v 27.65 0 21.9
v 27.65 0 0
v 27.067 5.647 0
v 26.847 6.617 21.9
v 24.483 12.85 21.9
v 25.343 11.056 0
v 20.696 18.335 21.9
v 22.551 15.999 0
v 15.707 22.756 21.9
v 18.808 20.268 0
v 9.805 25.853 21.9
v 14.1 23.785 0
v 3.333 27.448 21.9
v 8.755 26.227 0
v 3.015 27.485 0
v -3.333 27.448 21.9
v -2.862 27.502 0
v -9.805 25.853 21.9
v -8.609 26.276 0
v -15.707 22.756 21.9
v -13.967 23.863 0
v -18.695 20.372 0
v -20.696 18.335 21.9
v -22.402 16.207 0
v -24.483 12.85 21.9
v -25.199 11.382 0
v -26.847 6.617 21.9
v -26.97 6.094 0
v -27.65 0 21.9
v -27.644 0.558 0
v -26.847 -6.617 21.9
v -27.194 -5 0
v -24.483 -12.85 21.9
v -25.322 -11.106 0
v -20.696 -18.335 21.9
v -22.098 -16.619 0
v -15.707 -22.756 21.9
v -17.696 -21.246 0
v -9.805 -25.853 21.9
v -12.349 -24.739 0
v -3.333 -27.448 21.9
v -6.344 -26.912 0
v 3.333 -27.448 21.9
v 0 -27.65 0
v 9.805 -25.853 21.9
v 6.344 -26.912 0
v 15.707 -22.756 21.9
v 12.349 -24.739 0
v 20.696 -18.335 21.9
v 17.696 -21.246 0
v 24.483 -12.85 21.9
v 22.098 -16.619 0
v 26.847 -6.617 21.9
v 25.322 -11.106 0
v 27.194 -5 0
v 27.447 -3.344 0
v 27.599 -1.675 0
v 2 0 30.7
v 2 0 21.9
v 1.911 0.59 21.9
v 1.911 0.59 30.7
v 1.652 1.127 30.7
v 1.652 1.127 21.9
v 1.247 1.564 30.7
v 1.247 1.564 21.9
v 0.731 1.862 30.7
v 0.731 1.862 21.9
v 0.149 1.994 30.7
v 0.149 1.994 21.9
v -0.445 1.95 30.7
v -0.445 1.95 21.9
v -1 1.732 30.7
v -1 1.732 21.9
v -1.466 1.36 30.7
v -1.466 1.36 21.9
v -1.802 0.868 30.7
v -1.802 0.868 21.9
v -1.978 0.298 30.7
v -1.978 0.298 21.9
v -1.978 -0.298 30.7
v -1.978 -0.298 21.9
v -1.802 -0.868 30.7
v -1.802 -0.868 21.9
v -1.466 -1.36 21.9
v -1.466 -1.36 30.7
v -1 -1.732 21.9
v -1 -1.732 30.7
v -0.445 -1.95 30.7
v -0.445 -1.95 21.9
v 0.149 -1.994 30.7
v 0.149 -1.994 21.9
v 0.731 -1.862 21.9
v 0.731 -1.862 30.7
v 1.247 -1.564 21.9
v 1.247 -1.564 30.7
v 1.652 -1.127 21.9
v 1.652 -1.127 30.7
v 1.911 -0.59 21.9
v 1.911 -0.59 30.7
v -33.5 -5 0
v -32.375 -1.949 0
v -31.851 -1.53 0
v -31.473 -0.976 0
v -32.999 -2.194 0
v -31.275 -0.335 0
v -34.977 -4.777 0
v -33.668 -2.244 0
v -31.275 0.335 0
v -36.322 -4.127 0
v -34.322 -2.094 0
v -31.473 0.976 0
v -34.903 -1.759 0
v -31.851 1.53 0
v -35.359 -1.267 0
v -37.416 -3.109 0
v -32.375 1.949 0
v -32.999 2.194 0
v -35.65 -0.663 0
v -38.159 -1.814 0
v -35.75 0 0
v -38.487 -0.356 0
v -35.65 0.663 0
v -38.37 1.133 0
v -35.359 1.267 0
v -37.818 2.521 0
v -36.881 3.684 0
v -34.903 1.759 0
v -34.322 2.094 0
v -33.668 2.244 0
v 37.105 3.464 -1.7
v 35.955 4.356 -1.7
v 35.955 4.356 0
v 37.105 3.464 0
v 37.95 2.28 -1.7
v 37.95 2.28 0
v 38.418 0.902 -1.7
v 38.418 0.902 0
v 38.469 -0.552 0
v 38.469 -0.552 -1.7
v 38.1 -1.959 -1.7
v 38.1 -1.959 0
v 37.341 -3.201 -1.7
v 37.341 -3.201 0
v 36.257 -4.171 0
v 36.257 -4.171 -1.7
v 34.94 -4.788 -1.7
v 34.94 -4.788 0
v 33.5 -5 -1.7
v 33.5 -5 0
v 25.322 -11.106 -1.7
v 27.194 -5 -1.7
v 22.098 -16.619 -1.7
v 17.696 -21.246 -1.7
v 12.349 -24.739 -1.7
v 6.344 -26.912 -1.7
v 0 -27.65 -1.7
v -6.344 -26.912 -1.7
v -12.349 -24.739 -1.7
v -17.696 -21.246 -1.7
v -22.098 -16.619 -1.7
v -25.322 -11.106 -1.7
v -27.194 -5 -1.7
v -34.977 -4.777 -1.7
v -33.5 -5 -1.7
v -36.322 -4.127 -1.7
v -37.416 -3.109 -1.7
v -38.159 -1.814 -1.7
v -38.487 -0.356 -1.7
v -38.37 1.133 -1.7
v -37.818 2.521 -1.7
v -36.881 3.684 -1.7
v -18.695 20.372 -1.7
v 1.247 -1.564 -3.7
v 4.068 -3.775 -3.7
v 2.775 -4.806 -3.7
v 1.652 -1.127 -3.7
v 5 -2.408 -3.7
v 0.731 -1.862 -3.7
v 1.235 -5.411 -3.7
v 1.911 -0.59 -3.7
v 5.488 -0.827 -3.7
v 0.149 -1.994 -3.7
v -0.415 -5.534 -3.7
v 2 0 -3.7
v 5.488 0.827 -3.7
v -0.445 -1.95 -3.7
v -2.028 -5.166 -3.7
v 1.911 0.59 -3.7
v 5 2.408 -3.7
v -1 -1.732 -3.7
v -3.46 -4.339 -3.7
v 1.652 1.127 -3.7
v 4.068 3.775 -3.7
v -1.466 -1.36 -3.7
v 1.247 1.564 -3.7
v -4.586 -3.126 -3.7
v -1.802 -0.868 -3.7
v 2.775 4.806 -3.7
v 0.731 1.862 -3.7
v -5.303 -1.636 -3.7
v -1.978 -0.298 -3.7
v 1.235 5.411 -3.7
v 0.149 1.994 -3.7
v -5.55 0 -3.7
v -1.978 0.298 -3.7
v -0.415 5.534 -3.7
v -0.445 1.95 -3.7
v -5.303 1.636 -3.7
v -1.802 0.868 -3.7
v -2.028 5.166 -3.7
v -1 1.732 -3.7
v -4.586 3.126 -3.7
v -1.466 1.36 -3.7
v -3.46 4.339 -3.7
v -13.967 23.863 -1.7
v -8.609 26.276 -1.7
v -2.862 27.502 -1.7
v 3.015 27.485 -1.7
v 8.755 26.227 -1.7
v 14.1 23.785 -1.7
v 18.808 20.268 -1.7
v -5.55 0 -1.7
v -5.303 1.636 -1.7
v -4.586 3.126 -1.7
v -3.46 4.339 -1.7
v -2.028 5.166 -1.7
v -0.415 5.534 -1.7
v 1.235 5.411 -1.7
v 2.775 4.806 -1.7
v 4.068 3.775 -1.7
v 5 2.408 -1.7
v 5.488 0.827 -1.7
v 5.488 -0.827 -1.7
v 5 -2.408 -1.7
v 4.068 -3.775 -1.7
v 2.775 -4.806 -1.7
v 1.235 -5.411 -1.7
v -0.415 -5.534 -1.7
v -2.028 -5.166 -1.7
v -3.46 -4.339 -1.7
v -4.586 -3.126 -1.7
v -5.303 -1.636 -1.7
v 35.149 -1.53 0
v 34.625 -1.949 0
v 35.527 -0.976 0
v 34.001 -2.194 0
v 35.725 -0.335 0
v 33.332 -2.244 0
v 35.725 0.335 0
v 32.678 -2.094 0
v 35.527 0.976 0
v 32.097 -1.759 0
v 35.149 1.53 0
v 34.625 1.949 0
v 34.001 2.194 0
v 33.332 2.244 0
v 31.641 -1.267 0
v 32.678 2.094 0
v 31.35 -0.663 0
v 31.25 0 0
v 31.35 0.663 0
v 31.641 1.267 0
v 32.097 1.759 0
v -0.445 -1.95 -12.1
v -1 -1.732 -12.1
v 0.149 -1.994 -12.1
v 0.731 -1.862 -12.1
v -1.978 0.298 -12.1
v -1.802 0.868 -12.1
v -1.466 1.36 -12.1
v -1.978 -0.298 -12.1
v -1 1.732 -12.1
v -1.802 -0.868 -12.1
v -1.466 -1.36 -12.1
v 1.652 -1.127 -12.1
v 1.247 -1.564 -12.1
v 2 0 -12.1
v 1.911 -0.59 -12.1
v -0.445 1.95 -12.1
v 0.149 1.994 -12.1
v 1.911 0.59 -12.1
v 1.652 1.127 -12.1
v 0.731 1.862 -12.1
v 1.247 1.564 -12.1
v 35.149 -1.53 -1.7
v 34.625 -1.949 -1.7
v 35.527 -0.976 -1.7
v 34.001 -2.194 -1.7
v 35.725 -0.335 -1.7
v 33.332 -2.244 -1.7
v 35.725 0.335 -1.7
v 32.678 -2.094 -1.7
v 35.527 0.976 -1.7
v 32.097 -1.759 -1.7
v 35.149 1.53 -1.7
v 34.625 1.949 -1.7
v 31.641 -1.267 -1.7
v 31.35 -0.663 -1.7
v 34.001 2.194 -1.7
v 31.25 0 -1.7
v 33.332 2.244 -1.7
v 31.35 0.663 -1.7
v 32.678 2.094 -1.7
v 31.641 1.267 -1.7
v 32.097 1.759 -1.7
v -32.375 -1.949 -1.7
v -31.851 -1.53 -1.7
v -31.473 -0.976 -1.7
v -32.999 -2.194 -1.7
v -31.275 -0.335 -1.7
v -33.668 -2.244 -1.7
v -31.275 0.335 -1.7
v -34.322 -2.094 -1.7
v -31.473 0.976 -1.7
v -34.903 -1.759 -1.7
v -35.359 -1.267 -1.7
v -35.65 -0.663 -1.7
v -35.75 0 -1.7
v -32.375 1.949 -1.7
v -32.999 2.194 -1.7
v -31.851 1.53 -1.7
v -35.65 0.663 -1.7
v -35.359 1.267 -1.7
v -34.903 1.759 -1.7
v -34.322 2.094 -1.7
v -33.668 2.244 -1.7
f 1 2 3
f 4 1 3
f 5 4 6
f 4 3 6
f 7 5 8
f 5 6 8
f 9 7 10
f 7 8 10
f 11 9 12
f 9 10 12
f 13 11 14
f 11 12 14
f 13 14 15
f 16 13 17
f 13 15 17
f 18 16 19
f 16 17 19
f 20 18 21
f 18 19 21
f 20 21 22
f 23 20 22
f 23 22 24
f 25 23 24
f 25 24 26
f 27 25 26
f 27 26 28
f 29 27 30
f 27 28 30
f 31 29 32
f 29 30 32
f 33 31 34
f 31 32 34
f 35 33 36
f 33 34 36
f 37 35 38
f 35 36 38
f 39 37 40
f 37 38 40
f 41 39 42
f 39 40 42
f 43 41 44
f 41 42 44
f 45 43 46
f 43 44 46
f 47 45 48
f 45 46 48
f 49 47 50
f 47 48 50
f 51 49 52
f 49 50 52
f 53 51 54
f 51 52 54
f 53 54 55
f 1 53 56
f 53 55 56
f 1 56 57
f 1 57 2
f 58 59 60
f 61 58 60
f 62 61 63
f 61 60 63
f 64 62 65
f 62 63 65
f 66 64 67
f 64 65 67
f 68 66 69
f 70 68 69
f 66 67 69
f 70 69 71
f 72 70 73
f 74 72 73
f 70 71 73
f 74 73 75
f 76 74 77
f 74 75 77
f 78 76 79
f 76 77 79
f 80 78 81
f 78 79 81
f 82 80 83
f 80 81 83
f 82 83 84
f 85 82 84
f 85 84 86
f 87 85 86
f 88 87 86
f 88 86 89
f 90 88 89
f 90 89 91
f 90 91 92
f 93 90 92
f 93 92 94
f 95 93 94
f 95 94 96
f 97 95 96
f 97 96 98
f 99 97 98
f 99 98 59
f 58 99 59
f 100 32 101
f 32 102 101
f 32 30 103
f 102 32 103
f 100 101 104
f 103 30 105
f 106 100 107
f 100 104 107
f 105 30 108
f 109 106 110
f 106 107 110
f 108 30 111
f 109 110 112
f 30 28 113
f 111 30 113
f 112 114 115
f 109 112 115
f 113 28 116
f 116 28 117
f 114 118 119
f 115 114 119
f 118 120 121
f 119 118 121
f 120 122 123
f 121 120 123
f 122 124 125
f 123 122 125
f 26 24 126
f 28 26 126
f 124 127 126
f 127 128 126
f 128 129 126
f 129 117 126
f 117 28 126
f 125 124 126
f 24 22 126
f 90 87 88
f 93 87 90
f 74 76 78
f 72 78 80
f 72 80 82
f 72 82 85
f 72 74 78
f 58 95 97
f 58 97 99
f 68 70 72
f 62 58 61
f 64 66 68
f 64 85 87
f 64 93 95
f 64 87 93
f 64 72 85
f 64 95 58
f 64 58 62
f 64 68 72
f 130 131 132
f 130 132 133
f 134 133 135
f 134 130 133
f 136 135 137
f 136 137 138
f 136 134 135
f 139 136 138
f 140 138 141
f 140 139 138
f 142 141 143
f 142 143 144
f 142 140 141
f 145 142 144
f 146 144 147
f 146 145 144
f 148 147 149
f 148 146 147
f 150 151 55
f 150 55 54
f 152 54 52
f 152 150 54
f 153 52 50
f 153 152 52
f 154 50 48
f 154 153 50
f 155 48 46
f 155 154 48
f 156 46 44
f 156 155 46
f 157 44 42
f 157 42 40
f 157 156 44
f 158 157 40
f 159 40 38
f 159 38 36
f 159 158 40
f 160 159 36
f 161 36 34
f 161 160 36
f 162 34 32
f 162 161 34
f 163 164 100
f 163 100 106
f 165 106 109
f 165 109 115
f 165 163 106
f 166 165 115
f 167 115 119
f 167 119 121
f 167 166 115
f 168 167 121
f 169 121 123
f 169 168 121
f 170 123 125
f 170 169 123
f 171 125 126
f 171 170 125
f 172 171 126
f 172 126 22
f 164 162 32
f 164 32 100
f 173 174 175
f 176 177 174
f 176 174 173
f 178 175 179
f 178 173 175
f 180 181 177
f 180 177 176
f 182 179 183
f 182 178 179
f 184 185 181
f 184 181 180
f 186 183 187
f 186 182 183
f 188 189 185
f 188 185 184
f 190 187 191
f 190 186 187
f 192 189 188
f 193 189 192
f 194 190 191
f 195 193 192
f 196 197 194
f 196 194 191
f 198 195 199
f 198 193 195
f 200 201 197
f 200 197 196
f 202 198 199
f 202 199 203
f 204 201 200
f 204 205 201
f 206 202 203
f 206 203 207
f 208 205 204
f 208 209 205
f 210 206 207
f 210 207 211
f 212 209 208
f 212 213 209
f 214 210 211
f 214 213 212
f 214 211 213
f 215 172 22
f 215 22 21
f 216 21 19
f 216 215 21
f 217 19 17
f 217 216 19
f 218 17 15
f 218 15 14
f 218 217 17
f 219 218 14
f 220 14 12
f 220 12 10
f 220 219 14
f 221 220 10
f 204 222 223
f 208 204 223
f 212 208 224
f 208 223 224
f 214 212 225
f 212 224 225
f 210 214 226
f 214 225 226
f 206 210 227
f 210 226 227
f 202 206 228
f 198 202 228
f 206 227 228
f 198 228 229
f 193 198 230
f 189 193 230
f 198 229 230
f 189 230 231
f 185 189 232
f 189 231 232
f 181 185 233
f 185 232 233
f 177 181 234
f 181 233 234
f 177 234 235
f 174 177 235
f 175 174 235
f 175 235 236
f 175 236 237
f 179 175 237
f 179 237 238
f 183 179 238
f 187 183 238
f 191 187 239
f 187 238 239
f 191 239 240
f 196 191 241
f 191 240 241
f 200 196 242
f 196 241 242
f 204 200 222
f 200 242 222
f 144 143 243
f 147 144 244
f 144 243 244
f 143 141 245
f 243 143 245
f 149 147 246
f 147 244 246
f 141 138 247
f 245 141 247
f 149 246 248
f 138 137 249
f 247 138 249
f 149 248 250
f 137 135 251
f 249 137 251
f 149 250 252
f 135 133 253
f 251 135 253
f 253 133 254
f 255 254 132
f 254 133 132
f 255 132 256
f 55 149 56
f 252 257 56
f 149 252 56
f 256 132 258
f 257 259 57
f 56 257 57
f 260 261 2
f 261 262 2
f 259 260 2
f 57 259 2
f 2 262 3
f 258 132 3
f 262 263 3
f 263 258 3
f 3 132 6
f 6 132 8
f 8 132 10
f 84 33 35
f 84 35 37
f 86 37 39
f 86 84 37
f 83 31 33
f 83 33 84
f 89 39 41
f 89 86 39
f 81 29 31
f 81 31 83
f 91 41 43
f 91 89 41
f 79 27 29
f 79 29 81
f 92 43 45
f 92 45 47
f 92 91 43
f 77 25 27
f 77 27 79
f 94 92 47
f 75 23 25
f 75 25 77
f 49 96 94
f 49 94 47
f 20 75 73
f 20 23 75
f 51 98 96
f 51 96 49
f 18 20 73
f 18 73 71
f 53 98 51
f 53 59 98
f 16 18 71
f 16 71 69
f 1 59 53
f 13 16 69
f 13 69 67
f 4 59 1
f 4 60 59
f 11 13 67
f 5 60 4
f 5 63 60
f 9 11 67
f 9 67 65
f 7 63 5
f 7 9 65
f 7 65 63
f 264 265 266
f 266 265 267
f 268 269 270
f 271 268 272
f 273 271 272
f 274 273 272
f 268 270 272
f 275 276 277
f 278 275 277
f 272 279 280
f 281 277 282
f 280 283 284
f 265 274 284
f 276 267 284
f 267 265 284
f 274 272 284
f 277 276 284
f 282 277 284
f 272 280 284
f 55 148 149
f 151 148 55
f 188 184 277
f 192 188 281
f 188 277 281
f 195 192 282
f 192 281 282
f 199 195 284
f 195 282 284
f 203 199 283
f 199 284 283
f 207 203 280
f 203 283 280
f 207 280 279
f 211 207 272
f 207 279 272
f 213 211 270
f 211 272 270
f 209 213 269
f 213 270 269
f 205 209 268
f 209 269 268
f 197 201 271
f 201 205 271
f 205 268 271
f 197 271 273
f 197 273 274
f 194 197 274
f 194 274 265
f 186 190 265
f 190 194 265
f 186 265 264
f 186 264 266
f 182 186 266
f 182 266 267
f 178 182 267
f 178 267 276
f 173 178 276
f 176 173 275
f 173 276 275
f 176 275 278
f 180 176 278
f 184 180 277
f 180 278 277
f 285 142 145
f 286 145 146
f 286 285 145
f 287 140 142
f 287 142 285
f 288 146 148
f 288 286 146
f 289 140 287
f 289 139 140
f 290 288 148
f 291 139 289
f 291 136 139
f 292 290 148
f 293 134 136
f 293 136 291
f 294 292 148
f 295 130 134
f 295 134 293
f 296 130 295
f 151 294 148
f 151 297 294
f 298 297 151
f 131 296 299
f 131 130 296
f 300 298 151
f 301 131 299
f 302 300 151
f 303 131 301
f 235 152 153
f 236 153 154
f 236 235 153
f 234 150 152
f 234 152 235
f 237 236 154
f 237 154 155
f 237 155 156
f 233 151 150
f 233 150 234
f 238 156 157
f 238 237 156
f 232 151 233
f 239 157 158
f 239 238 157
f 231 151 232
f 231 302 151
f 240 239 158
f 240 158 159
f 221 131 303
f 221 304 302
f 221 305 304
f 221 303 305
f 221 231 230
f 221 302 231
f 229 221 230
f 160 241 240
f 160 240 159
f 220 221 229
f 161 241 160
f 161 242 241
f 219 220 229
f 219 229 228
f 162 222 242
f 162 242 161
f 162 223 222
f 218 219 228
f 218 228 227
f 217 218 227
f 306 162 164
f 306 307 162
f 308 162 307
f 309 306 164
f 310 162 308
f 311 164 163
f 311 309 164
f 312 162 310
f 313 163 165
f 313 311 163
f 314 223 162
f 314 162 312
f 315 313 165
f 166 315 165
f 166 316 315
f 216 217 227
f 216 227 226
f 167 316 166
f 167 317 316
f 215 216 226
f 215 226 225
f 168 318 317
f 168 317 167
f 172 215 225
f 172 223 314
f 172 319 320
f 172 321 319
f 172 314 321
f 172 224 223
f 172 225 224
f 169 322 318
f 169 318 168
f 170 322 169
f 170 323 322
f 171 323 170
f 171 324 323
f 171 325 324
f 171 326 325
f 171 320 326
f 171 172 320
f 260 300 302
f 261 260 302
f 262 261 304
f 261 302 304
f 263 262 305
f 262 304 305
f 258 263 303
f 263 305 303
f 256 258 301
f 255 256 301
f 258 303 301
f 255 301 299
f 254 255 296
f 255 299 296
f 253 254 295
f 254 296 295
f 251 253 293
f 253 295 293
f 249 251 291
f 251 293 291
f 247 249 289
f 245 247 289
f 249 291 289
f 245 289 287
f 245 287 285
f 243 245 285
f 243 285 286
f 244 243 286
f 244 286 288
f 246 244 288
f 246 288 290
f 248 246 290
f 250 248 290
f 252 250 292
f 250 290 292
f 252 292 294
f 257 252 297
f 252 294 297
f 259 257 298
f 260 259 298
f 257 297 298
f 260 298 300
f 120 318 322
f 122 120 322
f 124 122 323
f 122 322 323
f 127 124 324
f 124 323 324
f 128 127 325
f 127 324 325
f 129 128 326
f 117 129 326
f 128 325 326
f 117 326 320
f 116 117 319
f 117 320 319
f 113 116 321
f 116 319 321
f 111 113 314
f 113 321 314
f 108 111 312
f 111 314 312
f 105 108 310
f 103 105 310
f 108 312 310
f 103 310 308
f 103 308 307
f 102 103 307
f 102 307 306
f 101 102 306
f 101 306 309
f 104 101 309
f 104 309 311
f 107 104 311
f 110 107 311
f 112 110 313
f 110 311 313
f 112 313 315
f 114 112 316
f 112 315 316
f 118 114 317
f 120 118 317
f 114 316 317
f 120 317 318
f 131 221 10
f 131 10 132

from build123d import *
from build123d.topology import SkipClean

# Parameters (mm, degrees)
CROQUIS1_R                   = 27.65
SALIENTE_EXTRUIR1_DEPTH      = 21.9
SALIENTE_EXTRUIR2_DEPTH      = 8.8
SALIENTE_EXTRUIR2_DEPTH_BACK = 34
CROQUIS2_R                   = 2
SALIENTE_EXTRUIR3_START      = 1.7
CROQUIS3_R                   = 2.25
CROQUIS3_R_2                 = 2
SALIENTE_EXTRUIR3_DEPTH      = 1.7
CROQUIS4_R                   = 5.55
SALIENTE_EXTRUIR4_DEPTH      = 2


with BuildPart() as part:
    # Croquis1 → Saliente-Extruir1 (new body)
    with BuildSketch(Plane.XY):
        Circle(CROQUIS1_R)
    extrude(amount=SALIENTE_EXTRUIR1_DEPTH)

    # Croquis2 → Saliente-Extruir2 (add, two sides: drawn at the far end of the back side and taken through both)
    with BuildSketch(Plane.XY.offset(21.9).offset(-SALIENTE_EXTRUIR2_DEPTH_BACK)):
        Circle(CROQUIS2_R)
    extrude(amount=SALIENTE_EXTRUIR2_DEPTH + SALIENTE_EXTRUIR2_DEPTH_BACK)

    # Croquis3 → Saliente-Extruir3 (add)
    with SkipClean():  # the faces are left unmerged after this step: merging them gives an invalid solid
        with BuildSketch(Plane(origin=(0, 0, 0), x_dir=(-1, 0, 0), z_dir=(0, 0, -1)).offset(SALIENTE_EXTRUIR3_START)):
            with BuildLine():
                Line((27.194162977, -5), (33.5, -5))
                ThreePointArc((33.5, -5), (38.159388464, -1.813863043), (36.880597015, 3.683960345))
                Line((36.880597015, 3.683960345), (18.694701493, 20.372300707))
                ThreePointArc((18.694701493, 20.372300707), (-0.0770274, 27.649892708), (-18.80791724, 20.267825466))
                Line((-18.80791724, 20.267825466), (-35.955174002, 4.355699785))
                ThreePointArc((-35.955174002, 4.355699785), (-38.336243321, -1.269153473), (-33.5, -5))
                Line((-33.5, -5), (-27.194162977, -5))
                ThreePointArc((-27.194162977, -5), (0, -27.65), (27.194162977, -5))
            make_face()
            with Locations((33.5, 0)):
                Circle(CROQUIS3_R, mode=Mode.SUBTRACT)
            with Locations(Location((0, 0, 0), (0, 0, 180))):
                Circle(CROQUIS3_R_2, mode=Mode.SUBTRACT)
            with Locations((-33.5, 0)):
                Circle(CROQUIS3_R, mode=Mode.SUBTRACT)
        extrude(amount=-SALIENTE_EXTRUIR3_DEPTH)

    # Croquis4 → Saliente-Extruir4 (add)
    with SkipClean():  # the faces are left unmerged after this step: merging them gives an invalid solid
        with BuildSketch(Plane(origin=(0, 0, -1.7), x_dir=(-1, 0, 0), z_dir=(0, 0, -1))):
            Circle(CROQUIS4_R)
        extrude(amount=SALIENTE_EXTRUIR4_DEPTH)


solid = part.part
